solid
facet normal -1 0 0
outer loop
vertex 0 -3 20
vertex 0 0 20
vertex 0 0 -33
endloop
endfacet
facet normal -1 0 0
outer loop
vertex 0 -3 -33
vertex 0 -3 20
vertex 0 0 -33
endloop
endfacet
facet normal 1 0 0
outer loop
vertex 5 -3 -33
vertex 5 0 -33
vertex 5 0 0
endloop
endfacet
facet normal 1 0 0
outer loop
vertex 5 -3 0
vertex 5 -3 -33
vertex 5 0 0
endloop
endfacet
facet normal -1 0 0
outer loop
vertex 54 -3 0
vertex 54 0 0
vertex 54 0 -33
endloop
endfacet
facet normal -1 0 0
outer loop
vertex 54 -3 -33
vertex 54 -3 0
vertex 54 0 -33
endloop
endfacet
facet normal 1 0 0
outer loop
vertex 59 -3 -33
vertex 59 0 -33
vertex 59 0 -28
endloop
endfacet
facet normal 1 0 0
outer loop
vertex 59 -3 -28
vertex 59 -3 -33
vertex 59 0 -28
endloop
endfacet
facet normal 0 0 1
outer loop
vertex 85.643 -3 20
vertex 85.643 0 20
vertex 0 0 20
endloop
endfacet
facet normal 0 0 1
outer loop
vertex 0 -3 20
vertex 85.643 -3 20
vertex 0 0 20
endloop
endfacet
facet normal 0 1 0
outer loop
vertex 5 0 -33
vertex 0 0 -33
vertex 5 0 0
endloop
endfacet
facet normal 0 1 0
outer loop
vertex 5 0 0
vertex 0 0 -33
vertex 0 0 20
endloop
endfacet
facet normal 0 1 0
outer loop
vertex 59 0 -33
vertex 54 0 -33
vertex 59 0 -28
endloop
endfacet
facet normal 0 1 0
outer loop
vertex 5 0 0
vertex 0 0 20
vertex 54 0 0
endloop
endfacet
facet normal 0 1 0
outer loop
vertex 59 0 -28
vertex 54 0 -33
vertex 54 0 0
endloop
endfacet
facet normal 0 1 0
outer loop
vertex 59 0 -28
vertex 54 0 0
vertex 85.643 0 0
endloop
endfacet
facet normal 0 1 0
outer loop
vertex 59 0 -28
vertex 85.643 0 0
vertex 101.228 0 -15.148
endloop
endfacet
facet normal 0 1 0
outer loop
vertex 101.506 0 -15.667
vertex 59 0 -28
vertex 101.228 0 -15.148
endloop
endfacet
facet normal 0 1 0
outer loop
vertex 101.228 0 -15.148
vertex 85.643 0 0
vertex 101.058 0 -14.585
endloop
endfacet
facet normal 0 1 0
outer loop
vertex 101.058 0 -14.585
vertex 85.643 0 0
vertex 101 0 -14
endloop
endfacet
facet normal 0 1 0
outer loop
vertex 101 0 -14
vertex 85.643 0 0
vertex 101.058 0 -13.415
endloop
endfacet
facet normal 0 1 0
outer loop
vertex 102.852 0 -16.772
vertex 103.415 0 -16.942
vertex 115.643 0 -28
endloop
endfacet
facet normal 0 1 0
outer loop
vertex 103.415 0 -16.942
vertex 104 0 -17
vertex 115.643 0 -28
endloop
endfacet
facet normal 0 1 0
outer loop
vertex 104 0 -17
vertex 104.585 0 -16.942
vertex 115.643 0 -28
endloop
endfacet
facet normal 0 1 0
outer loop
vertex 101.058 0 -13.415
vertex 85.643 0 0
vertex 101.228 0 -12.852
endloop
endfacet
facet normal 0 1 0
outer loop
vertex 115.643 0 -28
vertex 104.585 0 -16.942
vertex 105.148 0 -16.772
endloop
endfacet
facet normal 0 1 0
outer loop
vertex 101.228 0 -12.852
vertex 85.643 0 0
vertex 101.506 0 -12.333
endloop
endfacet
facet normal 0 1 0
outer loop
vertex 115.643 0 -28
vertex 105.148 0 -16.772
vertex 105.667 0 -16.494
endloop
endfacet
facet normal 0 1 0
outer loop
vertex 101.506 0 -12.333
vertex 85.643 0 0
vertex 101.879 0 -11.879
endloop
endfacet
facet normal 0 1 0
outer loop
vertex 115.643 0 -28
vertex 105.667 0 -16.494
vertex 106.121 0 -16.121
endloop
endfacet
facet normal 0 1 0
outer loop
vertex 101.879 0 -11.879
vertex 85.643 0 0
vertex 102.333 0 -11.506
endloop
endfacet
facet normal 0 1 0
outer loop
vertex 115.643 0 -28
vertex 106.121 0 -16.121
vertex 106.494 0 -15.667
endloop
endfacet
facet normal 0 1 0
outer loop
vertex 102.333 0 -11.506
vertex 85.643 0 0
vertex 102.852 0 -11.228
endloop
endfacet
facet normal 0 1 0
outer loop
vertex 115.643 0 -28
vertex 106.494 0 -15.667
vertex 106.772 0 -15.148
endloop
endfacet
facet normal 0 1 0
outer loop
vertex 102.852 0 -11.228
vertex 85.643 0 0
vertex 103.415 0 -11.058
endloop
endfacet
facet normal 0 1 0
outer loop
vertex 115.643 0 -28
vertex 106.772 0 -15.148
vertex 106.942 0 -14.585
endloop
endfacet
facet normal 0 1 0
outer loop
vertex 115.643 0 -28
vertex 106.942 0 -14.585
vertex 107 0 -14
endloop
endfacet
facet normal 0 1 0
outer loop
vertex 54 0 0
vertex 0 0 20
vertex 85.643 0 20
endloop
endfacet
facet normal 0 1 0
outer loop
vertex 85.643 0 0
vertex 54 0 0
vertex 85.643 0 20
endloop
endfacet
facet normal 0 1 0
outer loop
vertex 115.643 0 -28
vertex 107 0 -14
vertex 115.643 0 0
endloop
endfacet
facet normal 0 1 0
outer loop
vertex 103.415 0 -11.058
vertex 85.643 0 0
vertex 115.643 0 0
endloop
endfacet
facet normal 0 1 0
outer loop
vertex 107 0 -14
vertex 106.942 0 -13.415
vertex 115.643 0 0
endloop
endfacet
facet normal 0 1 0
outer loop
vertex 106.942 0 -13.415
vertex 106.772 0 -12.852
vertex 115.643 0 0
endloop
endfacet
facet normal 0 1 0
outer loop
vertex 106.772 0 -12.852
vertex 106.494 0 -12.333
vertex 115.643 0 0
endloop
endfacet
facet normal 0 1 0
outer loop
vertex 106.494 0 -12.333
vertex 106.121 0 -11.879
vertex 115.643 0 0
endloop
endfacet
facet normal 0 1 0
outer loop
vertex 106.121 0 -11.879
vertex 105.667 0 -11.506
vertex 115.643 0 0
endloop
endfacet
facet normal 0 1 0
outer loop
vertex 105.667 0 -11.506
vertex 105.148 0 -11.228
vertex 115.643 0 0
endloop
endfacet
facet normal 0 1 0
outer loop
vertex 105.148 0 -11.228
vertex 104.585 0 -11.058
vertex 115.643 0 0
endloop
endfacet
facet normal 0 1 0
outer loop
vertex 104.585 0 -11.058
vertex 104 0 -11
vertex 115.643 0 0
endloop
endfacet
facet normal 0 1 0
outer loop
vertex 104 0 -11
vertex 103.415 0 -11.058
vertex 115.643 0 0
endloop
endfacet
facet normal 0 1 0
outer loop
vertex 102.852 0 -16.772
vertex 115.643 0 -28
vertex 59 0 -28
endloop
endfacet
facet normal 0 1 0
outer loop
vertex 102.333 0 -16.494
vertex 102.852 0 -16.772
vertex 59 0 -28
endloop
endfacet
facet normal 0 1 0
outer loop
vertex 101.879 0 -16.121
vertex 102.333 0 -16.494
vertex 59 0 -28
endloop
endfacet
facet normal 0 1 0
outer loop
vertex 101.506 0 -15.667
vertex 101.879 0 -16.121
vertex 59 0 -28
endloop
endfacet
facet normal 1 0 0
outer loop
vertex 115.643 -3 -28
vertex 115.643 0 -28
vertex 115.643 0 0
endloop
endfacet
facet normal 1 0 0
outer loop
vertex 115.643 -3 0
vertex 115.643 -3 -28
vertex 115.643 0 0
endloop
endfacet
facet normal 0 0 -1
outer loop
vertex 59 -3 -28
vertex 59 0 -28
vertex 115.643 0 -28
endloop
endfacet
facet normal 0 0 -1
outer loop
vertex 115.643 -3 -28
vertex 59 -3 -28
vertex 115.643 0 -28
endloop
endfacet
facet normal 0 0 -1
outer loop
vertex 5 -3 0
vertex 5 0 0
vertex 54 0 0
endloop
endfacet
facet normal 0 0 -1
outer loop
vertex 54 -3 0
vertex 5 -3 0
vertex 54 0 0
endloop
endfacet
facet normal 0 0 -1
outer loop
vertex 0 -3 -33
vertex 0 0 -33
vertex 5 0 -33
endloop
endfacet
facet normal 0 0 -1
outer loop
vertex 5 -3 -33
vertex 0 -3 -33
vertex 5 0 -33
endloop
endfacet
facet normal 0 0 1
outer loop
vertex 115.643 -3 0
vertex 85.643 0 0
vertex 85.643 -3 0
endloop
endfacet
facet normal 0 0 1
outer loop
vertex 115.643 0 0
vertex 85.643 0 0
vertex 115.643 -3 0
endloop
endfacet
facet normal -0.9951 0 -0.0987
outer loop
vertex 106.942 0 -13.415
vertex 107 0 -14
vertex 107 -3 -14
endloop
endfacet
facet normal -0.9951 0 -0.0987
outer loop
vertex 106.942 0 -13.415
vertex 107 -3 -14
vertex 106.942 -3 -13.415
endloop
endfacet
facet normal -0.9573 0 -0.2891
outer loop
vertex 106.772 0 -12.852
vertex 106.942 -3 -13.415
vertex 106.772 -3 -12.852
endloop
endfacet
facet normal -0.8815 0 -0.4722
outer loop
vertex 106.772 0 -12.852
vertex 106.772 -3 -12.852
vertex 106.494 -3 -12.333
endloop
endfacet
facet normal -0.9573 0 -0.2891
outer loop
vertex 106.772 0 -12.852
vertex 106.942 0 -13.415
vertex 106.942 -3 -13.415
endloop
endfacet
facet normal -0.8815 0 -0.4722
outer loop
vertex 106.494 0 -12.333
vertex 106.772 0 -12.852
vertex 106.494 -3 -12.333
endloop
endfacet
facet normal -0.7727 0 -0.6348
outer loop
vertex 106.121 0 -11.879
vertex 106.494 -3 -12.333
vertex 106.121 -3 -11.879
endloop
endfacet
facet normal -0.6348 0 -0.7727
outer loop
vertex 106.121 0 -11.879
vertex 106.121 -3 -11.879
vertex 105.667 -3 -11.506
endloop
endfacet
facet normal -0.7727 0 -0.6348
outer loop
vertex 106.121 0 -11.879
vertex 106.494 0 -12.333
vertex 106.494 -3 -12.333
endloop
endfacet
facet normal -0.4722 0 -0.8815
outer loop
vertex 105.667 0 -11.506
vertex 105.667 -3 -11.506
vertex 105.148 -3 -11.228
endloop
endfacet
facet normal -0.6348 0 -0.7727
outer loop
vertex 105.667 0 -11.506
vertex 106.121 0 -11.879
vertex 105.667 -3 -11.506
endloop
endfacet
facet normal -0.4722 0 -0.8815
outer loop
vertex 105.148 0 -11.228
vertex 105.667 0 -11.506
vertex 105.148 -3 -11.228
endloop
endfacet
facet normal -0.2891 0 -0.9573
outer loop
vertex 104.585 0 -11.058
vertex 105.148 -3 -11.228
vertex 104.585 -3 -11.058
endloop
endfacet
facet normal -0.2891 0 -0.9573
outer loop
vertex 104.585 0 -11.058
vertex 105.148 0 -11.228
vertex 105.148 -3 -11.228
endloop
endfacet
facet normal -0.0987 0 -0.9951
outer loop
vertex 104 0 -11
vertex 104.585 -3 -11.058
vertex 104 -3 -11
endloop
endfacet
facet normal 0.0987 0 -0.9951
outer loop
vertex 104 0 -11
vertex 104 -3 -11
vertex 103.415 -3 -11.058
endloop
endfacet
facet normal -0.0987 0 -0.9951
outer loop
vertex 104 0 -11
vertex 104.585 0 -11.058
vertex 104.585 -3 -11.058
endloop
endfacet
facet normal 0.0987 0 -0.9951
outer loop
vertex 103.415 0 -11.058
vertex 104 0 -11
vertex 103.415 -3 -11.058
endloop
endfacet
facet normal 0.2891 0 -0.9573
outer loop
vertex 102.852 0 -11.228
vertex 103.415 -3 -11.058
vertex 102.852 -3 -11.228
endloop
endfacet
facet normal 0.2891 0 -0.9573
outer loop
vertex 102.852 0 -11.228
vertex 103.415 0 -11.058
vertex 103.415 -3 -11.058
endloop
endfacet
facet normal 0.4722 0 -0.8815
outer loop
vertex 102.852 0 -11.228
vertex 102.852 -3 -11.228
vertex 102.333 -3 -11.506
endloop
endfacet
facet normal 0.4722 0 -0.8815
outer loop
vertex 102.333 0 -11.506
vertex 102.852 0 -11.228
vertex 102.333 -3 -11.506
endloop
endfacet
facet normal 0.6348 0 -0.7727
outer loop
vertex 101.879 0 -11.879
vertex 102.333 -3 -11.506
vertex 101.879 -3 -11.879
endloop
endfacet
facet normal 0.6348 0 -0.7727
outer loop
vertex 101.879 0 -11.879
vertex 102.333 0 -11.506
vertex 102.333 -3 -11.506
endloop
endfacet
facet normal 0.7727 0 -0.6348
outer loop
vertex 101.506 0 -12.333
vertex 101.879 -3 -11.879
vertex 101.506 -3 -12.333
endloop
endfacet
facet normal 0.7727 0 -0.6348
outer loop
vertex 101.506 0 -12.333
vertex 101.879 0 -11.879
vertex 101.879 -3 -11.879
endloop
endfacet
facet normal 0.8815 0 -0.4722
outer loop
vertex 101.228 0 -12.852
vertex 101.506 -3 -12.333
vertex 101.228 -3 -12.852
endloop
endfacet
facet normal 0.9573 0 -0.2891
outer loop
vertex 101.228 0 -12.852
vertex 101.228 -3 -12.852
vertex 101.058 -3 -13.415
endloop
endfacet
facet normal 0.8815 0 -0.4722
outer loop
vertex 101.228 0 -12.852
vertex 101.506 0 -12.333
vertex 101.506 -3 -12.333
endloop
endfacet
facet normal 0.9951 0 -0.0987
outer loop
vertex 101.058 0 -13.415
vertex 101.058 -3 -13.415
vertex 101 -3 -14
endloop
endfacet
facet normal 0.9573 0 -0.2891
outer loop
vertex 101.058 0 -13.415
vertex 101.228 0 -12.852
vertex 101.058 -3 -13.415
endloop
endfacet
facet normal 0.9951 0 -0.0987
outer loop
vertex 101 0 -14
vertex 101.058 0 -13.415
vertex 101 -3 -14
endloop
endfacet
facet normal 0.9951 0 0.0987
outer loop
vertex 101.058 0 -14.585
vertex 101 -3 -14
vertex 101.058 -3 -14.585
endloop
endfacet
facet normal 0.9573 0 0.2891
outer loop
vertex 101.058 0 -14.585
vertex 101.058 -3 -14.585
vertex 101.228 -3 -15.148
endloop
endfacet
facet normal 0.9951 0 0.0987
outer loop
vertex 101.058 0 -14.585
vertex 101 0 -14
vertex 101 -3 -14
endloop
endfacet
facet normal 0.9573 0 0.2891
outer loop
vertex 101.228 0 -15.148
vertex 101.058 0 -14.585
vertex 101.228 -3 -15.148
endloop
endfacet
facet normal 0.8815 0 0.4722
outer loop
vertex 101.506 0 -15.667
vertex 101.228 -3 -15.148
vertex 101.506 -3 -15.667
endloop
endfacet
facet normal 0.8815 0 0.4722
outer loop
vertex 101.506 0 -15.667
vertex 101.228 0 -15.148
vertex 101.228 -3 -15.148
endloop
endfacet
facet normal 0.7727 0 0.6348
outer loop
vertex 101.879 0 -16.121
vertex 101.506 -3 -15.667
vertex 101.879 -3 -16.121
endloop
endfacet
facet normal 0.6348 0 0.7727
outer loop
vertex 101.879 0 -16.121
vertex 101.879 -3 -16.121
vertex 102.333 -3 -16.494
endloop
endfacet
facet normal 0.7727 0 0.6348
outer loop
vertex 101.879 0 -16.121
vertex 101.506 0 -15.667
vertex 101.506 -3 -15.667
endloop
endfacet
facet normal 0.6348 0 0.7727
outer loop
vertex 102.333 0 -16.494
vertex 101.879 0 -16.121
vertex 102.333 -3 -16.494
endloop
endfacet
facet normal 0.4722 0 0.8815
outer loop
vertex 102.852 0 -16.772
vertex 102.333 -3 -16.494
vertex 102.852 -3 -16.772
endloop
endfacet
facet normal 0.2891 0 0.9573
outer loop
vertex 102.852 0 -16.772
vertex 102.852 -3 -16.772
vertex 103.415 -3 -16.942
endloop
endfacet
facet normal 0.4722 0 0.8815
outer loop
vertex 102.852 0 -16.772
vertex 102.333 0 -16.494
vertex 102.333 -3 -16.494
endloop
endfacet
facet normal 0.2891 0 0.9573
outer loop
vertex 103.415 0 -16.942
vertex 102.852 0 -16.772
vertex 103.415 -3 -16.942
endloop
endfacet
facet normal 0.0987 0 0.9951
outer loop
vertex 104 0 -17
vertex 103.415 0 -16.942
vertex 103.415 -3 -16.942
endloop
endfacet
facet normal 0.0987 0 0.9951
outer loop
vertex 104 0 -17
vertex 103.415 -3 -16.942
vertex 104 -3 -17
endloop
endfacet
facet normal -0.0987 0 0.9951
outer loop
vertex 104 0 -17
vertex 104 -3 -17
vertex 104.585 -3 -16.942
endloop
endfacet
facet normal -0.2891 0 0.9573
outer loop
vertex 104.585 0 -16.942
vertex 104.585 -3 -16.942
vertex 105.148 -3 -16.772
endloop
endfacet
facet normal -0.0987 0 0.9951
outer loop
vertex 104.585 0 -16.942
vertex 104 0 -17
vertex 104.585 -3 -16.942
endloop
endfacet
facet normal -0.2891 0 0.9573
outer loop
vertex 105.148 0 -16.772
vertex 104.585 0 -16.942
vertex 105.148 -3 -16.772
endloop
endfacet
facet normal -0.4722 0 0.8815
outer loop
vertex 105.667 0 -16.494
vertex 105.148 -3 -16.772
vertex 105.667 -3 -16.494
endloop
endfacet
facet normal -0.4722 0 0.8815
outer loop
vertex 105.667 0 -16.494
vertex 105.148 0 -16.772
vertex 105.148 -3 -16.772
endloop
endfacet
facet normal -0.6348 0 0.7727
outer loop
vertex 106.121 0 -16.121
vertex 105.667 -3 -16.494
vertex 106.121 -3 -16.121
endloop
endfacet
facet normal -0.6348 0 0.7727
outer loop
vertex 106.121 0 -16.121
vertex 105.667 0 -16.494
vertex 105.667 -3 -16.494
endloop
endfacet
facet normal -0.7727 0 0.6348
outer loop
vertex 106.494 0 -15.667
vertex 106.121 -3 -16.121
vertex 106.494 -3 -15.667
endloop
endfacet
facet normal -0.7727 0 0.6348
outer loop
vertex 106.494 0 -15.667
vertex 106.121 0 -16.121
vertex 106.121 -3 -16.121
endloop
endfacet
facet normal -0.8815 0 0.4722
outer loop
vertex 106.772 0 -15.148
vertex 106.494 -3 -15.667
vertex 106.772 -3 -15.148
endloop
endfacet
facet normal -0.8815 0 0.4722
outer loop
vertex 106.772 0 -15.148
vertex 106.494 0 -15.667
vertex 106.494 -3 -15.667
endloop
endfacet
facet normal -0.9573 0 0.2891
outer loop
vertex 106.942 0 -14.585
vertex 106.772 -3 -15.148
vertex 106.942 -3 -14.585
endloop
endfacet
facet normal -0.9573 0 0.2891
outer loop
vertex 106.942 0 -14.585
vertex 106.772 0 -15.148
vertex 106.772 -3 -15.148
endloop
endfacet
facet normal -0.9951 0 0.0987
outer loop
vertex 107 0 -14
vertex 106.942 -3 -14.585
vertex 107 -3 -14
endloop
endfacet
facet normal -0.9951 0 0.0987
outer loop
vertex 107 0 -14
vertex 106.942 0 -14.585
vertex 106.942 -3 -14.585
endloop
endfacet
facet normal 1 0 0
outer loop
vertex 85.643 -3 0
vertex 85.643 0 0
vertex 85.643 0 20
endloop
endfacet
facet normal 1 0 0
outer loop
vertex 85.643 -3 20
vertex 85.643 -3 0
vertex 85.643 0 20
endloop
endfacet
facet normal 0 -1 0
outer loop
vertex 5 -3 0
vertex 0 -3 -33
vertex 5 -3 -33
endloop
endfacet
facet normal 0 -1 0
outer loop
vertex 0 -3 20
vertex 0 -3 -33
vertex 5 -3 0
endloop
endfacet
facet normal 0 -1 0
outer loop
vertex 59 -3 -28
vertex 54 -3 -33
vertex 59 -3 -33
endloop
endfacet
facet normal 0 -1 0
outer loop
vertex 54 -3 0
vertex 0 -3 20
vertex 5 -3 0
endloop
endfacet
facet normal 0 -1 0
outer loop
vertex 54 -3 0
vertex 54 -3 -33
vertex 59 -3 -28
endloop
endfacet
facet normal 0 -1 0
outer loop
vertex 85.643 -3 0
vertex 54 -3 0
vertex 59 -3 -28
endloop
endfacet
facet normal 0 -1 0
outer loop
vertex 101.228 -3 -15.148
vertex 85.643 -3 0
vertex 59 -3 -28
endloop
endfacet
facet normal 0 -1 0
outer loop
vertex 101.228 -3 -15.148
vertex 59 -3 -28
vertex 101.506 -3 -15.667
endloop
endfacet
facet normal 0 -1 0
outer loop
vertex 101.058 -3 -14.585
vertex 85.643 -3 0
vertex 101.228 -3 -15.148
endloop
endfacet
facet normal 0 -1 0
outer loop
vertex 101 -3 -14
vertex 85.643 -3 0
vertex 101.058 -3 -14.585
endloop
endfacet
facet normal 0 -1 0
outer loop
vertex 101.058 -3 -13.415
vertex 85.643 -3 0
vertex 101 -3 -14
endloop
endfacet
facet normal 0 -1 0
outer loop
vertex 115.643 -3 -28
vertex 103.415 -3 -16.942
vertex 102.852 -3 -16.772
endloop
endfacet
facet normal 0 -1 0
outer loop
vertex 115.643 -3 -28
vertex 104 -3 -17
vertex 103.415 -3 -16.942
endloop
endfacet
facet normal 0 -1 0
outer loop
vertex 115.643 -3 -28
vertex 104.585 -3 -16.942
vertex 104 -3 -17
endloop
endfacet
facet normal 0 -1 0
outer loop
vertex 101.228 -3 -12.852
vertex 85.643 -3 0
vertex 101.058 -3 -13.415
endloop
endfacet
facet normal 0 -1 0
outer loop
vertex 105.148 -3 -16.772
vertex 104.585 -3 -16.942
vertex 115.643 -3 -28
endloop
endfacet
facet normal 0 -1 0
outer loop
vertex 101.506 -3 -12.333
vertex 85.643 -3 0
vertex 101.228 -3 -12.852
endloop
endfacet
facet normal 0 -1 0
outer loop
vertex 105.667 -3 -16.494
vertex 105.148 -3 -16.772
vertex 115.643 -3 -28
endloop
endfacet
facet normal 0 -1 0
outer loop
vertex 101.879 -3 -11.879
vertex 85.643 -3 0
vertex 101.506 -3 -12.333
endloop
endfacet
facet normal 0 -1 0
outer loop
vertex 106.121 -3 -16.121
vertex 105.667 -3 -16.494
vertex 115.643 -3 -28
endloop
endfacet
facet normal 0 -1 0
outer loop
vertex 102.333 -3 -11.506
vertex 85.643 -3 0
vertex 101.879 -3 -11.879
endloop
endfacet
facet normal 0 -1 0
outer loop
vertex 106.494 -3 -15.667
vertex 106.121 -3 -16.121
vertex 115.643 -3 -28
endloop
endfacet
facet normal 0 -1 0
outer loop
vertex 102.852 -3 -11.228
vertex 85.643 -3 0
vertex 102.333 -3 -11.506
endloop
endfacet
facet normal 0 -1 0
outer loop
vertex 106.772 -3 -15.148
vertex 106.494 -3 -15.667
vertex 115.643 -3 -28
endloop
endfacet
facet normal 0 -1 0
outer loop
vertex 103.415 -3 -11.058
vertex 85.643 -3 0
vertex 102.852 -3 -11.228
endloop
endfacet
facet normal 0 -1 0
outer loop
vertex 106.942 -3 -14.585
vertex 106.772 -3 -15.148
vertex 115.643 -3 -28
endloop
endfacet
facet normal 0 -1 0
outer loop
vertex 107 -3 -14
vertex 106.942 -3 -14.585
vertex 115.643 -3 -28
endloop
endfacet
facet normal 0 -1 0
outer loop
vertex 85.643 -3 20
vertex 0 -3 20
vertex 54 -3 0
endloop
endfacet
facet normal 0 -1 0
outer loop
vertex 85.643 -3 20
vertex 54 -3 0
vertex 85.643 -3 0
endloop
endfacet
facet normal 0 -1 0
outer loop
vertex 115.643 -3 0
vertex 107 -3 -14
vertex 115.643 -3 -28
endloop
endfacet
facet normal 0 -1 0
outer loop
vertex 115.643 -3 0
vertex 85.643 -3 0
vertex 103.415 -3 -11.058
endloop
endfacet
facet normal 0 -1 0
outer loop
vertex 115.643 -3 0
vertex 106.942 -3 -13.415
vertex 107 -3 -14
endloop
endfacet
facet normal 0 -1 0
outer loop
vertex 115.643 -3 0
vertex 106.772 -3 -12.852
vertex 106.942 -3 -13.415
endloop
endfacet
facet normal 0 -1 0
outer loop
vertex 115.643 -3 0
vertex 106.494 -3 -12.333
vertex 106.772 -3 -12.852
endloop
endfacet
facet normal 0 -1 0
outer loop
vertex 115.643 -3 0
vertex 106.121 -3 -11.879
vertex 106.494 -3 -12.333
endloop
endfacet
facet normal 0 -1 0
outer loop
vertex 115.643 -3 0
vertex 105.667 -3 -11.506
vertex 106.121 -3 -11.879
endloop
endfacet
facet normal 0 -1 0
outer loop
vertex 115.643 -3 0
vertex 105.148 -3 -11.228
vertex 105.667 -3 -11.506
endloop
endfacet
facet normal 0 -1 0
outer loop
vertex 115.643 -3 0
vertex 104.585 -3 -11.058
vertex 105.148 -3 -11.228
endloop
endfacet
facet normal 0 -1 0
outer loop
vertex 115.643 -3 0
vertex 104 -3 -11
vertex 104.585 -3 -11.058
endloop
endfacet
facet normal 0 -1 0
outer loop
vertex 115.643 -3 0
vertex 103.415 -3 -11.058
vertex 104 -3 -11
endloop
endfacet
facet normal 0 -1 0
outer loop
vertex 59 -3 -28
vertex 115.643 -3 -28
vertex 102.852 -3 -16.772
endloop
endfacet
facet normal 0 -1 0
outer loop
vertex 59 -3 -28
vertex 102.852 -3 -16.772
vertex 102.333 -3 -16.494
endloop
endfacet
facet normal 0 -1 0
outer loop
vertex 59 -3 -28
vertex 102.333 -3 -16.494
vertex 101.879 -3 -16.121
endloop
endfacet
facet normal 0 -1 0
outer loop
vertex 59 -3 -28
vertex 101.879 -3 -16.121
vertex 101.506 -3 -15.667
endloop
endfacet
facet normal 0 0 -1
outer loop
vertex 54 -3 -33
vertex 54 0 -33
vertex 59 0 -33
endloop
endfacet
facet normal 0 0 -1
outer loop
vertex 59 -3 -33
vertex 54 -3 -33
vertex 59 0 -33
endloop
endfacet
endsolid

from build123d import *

# Parameters (mm, degrees)
F0_W     = 49
F0_H     = 20
F0_W_2   = 5
F0_H_2   = 33
F0_H_3   = 28
F0_H_4   = 5
F0_W_3   = 26.6433528662
F0_W_4   = 30
F0_R     = 3
F1_DEPTH = 3


# Not quite as in the source:
# - a feature names something its author has since deleted; it is built from what else it names


with BuildPart() as f1:
    # F0 (on Front) → F1 (new body)
    with BuildSketch(Plane.XZ):
        with Locations((29.5, 10)):
            Rectangle(F0_W, F0_H)
        with Locations((2.5, 10)):
            Rectangle(F0_W_2, F0_H)
        with Locations((2.5, -16.5)):
            Rectangle(F0_W_2, F0_H_2)
        with Locations((56.5, 10)):
            Rectangle(F0_W_2, F0_H)
        with Locations((56.5, -14)):
            Rectangle(F0_W_2, F0_H_3)
        with Locations((56.5, -30.5)):
            Rectangle(F0_W_2, F0_H_4)
        with Locations((72.3216764331, -14)):
            Rectangle(F0_W_3, F0_H_3)
        with Locations((72.3216764331, 10)):
            Rectangle(F0_W_3, F0_H)
        with Locations((100.6433528662, -14)):
            Rectangle(F0_W_4, F0_H_3)
        with Locations((104, -14)):
            Circle(F0_R, mode=Mode.SUBTRACT)
    extrude(amount=F1_DEPTH)


solid = f1.part
